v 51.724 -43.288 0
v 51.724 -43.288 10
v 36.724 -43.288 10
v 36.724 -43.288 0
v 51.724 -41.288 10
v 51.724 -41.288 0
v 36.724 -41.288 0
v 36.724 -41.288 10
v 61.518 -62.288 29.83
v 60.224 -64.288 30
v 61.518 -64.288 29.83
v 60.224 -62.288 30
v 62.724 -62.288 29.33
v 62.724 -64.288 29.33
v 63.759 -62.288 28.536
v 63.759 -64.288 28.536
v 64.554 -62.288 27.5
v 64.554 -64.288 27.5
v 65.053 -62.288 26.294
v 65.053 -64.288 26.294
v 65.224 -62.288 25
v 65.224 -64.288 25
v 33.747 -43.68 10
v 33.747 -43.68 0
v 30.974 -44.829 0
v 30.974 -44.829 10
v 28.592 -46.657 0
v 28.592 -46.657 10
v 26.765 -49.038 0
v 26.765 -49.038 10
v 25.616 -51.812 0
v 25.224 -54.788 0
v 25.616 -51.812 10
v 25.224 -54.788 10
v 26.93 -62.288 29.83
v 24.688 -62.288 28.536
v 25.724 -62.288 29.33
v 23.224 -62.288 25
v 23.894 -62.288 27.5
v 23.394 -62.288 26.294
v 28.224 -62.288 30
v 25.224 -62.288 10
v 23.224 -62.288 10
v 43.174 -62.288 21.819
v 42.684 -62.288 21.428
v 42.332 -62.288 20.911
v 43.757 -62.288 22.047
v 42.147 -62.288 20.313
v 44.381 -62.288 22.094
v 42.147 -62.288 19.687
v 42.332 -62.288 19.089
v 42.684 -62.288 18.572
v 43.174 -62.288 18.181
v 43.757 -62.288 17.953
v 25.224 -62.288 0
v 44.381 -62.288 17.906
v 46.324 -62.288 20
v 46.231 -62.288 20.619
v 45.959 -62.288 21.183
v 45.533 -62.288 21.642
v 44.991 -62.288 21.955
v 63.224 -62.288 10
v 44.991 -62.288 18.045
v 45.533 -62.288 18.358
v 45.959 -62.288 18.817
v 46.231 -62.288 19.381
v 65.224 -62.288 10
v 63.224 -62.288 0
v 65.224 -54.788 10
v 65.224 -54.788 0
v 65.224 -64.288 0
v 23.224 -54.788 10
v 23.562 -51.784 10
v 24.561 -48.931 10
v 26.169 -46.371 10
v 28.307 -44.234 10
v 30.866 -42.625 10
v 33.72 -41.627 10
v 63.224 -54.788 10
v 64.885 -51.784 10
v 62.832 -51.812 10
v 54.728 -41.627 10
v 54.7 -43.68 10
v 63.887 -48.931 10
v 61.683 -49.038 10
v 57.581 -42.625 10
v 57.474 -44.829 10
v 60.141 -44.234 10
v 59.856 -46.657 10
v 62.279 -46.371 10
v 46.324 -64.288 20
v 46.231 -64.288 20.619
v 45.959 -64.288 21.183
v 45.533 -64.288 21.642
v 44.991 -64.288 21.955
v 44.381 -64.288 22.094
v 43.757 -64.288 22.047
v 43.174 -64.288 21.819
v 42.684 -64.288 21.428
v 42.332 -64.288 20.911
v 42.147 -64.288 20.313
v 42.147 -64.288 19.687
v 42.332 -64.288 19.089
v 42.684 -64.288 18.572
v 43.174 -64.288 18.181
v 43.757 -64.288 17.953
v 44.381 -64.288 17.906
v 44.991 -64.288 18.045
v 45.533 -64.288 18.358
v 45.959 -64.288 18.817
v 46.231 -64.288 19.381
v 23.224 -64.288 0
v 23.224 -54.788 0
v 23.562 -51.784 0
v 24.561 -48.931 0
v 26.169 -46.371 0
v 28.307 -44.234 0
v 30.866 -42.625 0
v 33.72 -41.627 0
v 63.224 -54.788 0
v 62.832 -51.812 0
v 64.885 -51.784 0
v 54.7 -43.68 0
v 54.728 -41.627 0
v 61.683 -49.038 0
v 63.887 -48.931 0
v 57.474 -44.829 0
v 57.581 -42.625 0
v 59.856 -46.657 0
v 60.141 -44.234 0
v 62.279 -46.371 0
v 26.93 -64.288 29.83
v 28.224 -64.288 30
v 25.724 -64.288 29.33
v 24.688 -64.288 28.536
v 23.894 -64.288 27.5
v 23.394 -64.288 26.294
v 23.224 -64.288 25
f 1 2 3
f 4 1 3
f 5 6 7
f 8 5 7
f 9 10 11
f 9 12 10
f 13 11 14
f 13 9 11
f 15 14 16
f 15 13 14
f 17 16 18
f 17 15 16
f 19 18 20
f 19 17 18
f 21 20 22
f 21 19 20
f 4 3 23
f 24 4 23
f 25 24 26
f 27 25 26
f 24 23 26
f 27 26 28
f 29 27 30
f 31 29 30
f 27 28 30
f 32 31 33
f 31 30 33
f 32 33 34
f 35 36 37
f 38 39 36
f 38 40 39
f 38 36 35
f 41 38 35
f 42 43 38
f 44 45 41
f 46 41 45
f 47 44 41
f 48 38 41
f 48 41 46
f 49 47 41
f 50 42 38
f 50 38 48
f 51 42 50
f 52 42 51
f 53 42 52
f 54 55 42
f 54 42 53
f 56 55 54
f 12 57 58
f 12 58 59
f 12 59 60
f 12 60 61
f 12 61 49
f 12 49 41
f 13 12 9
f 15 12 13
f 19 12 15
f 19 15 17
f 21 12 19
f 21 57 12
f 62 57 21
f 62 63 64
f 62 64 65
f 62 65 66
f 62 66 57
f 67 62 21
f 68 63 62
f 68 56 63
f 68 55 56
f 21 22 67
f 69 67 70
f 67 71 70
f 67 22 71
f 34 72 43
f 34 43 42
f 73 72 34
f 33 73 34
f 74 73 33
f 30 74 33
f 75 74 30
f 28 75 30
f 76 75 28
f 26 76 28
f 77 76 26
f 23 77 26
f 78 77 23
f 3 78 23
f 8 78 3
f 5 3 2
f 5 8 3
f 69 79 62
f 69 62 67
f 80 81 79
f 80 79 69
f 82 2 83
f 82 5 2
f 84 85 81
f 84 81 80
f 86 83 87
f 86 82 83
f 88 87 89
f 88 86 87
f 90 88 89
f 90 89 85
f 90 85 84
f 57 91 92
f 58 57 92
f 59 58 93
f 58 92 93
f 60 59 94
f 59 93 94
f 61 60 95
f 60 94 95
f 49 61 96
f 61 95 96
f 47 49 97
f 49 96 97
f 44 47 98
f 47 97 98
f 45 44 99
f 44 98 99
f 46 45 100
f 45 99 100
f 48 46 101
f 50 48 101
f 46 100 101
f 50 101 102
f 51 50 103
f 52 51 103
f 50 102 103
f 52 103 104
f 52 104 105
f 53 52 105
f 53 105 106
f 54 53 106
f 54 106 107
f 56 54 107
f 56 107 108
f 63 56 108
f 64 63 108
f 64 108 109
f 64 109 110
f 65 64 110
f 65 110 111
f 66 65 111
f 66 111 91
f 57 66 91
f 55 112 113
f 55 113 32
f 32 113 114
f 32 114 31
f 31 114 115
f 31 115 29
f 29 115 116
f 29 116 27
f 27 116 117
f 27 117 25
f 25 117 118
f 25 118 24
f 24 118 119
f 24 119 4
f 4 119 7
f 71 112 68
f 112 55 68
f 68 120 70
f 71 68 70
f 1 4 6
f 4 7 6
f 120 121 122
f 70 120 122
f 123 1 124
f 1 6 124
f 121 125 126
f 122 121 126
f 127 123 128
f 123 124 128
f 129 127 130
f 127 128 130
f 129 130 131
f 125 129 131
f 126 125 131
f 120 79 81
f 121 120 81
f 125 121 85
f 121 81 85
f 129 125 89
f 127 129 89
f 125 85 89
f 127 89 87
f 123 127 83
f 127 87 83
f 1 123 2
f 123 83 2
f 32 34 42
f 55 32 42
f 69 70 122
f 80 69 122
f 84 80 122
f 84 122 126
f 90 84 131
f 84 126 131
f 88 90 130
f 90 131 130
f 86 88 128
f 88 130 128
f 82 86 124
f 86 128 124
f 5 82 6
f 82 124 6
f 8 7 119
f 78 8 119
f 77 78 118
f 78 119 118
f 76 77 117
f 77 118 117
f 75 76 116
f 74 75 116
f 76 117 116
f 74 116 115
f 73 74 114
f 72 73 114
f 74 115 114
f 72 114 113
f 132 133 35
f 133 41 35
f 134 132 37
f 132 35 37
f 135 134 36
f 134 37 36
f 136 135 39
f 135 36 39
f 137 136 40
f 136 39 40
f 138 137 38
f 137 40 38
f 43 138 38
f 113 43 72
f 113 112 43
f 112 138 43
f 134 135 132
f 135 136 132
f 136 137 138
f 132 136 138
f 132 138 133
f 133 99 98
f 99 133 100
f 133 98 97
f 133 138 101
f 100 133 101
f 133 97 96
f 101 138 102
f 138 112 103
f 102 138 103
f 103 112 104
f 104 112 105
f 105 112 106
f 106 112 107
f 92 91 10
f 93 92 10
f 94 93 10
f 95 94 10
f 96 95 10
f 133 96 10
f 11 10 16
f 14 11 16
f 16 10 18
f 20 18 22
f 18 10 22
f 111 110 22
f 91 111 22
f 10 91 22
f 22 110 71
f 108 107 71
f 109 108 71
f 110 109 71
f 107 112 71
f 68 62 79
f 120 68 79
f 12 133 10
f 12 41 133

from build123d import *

# Parameters (mm, degrees)
F1_DEPTH = 10
F3_DEPTH = 25
F4_W     = 42
F4_H     = 2
F5_DEPTH = 20
F6_R     = 2.1
F7_DEPTH = 4
F8_R     = 5
F9_R     = 5


with BuildPart() as f1:
    # F0 (on Top) → F1 (new body)
    with BuildSketch(Plane.XY):
        with BuildLine():
            Line((51.723857, -41.288426), (36.723857, -41.288426))
            ThreePointArc((36.723857, -41.288426), (27.177916, -45.242484), (23.223857, -54.788426))
            Line((23.223857, -54.788426), (23.223857, -64.288426))
            Line((23.223857, -64.288426), (65.223857, -64.288426))
            Line((65.223857, -64.288426), (65.223857, -54.788426))
            ThreePointArc((65.223857, -54.788426), (61.269799, -45.242484), (51.723857, -41.288426))
        make_face()
    extrude(amount=F1_DEPTH)

    # F2 (on face) → F3 (cut)
    with BuildSketch(Plane.XY.offset(10)):
        with BuildLine():
            Line((51.723857, -43.288426), (36.723857, -43.288426))
            ThreePointArc((36.723857, -43.288426), (28.592129, -46.656698), (25.223857, -54.788426))
            Line((25.223857, -54.788426), (25.223857, -62.288426))
            Line((25.223857, -62.288426), (63.223857, -62.288426))
            Line((63.223857, -62.288426), (63.223857, -54.788426))
            ThreePointArc((63.223857, -54.788426), (59.855585, -46.656698), (51.723857, -43.288426))
        make_face()
    extrude(amount=-F3_DEPTH, mode=Mode.SUBTRACT)

    # F4 (on face) → F5 (join)
    with BuildSketch(Plane.XY.offset(10)):
        with Locations((44.223857, -63.288426)):
            Rectangle(F4_W, F4_H)
    extrude(amount=F5_DEPTH)

    # F6 (on face) → F7 (cut)
    with BuildSketch(Plane.XZ.offset(64.288426)):
        with Locations((44.223857, 20)):
            Circle(F6_R)
    extrude(amount=-F7_DEPTH, mode=Mode.SUBTRACT)

    # F8
    f8_edges = [f1.edges().sort_by_distance(p)[0] for p in [
        (65.223857, -63.288426, 30),
    ]]
    fillet(f8_edges, radius=F8_R)

    # F9
    f9_edges = [f1.edges().sort_by_distance(p)[0] for p in [
        (23.223857, -63.288426, 30),
    ]]
    fillet(f9_edges, radius=F9_R)


solid = f1.part
